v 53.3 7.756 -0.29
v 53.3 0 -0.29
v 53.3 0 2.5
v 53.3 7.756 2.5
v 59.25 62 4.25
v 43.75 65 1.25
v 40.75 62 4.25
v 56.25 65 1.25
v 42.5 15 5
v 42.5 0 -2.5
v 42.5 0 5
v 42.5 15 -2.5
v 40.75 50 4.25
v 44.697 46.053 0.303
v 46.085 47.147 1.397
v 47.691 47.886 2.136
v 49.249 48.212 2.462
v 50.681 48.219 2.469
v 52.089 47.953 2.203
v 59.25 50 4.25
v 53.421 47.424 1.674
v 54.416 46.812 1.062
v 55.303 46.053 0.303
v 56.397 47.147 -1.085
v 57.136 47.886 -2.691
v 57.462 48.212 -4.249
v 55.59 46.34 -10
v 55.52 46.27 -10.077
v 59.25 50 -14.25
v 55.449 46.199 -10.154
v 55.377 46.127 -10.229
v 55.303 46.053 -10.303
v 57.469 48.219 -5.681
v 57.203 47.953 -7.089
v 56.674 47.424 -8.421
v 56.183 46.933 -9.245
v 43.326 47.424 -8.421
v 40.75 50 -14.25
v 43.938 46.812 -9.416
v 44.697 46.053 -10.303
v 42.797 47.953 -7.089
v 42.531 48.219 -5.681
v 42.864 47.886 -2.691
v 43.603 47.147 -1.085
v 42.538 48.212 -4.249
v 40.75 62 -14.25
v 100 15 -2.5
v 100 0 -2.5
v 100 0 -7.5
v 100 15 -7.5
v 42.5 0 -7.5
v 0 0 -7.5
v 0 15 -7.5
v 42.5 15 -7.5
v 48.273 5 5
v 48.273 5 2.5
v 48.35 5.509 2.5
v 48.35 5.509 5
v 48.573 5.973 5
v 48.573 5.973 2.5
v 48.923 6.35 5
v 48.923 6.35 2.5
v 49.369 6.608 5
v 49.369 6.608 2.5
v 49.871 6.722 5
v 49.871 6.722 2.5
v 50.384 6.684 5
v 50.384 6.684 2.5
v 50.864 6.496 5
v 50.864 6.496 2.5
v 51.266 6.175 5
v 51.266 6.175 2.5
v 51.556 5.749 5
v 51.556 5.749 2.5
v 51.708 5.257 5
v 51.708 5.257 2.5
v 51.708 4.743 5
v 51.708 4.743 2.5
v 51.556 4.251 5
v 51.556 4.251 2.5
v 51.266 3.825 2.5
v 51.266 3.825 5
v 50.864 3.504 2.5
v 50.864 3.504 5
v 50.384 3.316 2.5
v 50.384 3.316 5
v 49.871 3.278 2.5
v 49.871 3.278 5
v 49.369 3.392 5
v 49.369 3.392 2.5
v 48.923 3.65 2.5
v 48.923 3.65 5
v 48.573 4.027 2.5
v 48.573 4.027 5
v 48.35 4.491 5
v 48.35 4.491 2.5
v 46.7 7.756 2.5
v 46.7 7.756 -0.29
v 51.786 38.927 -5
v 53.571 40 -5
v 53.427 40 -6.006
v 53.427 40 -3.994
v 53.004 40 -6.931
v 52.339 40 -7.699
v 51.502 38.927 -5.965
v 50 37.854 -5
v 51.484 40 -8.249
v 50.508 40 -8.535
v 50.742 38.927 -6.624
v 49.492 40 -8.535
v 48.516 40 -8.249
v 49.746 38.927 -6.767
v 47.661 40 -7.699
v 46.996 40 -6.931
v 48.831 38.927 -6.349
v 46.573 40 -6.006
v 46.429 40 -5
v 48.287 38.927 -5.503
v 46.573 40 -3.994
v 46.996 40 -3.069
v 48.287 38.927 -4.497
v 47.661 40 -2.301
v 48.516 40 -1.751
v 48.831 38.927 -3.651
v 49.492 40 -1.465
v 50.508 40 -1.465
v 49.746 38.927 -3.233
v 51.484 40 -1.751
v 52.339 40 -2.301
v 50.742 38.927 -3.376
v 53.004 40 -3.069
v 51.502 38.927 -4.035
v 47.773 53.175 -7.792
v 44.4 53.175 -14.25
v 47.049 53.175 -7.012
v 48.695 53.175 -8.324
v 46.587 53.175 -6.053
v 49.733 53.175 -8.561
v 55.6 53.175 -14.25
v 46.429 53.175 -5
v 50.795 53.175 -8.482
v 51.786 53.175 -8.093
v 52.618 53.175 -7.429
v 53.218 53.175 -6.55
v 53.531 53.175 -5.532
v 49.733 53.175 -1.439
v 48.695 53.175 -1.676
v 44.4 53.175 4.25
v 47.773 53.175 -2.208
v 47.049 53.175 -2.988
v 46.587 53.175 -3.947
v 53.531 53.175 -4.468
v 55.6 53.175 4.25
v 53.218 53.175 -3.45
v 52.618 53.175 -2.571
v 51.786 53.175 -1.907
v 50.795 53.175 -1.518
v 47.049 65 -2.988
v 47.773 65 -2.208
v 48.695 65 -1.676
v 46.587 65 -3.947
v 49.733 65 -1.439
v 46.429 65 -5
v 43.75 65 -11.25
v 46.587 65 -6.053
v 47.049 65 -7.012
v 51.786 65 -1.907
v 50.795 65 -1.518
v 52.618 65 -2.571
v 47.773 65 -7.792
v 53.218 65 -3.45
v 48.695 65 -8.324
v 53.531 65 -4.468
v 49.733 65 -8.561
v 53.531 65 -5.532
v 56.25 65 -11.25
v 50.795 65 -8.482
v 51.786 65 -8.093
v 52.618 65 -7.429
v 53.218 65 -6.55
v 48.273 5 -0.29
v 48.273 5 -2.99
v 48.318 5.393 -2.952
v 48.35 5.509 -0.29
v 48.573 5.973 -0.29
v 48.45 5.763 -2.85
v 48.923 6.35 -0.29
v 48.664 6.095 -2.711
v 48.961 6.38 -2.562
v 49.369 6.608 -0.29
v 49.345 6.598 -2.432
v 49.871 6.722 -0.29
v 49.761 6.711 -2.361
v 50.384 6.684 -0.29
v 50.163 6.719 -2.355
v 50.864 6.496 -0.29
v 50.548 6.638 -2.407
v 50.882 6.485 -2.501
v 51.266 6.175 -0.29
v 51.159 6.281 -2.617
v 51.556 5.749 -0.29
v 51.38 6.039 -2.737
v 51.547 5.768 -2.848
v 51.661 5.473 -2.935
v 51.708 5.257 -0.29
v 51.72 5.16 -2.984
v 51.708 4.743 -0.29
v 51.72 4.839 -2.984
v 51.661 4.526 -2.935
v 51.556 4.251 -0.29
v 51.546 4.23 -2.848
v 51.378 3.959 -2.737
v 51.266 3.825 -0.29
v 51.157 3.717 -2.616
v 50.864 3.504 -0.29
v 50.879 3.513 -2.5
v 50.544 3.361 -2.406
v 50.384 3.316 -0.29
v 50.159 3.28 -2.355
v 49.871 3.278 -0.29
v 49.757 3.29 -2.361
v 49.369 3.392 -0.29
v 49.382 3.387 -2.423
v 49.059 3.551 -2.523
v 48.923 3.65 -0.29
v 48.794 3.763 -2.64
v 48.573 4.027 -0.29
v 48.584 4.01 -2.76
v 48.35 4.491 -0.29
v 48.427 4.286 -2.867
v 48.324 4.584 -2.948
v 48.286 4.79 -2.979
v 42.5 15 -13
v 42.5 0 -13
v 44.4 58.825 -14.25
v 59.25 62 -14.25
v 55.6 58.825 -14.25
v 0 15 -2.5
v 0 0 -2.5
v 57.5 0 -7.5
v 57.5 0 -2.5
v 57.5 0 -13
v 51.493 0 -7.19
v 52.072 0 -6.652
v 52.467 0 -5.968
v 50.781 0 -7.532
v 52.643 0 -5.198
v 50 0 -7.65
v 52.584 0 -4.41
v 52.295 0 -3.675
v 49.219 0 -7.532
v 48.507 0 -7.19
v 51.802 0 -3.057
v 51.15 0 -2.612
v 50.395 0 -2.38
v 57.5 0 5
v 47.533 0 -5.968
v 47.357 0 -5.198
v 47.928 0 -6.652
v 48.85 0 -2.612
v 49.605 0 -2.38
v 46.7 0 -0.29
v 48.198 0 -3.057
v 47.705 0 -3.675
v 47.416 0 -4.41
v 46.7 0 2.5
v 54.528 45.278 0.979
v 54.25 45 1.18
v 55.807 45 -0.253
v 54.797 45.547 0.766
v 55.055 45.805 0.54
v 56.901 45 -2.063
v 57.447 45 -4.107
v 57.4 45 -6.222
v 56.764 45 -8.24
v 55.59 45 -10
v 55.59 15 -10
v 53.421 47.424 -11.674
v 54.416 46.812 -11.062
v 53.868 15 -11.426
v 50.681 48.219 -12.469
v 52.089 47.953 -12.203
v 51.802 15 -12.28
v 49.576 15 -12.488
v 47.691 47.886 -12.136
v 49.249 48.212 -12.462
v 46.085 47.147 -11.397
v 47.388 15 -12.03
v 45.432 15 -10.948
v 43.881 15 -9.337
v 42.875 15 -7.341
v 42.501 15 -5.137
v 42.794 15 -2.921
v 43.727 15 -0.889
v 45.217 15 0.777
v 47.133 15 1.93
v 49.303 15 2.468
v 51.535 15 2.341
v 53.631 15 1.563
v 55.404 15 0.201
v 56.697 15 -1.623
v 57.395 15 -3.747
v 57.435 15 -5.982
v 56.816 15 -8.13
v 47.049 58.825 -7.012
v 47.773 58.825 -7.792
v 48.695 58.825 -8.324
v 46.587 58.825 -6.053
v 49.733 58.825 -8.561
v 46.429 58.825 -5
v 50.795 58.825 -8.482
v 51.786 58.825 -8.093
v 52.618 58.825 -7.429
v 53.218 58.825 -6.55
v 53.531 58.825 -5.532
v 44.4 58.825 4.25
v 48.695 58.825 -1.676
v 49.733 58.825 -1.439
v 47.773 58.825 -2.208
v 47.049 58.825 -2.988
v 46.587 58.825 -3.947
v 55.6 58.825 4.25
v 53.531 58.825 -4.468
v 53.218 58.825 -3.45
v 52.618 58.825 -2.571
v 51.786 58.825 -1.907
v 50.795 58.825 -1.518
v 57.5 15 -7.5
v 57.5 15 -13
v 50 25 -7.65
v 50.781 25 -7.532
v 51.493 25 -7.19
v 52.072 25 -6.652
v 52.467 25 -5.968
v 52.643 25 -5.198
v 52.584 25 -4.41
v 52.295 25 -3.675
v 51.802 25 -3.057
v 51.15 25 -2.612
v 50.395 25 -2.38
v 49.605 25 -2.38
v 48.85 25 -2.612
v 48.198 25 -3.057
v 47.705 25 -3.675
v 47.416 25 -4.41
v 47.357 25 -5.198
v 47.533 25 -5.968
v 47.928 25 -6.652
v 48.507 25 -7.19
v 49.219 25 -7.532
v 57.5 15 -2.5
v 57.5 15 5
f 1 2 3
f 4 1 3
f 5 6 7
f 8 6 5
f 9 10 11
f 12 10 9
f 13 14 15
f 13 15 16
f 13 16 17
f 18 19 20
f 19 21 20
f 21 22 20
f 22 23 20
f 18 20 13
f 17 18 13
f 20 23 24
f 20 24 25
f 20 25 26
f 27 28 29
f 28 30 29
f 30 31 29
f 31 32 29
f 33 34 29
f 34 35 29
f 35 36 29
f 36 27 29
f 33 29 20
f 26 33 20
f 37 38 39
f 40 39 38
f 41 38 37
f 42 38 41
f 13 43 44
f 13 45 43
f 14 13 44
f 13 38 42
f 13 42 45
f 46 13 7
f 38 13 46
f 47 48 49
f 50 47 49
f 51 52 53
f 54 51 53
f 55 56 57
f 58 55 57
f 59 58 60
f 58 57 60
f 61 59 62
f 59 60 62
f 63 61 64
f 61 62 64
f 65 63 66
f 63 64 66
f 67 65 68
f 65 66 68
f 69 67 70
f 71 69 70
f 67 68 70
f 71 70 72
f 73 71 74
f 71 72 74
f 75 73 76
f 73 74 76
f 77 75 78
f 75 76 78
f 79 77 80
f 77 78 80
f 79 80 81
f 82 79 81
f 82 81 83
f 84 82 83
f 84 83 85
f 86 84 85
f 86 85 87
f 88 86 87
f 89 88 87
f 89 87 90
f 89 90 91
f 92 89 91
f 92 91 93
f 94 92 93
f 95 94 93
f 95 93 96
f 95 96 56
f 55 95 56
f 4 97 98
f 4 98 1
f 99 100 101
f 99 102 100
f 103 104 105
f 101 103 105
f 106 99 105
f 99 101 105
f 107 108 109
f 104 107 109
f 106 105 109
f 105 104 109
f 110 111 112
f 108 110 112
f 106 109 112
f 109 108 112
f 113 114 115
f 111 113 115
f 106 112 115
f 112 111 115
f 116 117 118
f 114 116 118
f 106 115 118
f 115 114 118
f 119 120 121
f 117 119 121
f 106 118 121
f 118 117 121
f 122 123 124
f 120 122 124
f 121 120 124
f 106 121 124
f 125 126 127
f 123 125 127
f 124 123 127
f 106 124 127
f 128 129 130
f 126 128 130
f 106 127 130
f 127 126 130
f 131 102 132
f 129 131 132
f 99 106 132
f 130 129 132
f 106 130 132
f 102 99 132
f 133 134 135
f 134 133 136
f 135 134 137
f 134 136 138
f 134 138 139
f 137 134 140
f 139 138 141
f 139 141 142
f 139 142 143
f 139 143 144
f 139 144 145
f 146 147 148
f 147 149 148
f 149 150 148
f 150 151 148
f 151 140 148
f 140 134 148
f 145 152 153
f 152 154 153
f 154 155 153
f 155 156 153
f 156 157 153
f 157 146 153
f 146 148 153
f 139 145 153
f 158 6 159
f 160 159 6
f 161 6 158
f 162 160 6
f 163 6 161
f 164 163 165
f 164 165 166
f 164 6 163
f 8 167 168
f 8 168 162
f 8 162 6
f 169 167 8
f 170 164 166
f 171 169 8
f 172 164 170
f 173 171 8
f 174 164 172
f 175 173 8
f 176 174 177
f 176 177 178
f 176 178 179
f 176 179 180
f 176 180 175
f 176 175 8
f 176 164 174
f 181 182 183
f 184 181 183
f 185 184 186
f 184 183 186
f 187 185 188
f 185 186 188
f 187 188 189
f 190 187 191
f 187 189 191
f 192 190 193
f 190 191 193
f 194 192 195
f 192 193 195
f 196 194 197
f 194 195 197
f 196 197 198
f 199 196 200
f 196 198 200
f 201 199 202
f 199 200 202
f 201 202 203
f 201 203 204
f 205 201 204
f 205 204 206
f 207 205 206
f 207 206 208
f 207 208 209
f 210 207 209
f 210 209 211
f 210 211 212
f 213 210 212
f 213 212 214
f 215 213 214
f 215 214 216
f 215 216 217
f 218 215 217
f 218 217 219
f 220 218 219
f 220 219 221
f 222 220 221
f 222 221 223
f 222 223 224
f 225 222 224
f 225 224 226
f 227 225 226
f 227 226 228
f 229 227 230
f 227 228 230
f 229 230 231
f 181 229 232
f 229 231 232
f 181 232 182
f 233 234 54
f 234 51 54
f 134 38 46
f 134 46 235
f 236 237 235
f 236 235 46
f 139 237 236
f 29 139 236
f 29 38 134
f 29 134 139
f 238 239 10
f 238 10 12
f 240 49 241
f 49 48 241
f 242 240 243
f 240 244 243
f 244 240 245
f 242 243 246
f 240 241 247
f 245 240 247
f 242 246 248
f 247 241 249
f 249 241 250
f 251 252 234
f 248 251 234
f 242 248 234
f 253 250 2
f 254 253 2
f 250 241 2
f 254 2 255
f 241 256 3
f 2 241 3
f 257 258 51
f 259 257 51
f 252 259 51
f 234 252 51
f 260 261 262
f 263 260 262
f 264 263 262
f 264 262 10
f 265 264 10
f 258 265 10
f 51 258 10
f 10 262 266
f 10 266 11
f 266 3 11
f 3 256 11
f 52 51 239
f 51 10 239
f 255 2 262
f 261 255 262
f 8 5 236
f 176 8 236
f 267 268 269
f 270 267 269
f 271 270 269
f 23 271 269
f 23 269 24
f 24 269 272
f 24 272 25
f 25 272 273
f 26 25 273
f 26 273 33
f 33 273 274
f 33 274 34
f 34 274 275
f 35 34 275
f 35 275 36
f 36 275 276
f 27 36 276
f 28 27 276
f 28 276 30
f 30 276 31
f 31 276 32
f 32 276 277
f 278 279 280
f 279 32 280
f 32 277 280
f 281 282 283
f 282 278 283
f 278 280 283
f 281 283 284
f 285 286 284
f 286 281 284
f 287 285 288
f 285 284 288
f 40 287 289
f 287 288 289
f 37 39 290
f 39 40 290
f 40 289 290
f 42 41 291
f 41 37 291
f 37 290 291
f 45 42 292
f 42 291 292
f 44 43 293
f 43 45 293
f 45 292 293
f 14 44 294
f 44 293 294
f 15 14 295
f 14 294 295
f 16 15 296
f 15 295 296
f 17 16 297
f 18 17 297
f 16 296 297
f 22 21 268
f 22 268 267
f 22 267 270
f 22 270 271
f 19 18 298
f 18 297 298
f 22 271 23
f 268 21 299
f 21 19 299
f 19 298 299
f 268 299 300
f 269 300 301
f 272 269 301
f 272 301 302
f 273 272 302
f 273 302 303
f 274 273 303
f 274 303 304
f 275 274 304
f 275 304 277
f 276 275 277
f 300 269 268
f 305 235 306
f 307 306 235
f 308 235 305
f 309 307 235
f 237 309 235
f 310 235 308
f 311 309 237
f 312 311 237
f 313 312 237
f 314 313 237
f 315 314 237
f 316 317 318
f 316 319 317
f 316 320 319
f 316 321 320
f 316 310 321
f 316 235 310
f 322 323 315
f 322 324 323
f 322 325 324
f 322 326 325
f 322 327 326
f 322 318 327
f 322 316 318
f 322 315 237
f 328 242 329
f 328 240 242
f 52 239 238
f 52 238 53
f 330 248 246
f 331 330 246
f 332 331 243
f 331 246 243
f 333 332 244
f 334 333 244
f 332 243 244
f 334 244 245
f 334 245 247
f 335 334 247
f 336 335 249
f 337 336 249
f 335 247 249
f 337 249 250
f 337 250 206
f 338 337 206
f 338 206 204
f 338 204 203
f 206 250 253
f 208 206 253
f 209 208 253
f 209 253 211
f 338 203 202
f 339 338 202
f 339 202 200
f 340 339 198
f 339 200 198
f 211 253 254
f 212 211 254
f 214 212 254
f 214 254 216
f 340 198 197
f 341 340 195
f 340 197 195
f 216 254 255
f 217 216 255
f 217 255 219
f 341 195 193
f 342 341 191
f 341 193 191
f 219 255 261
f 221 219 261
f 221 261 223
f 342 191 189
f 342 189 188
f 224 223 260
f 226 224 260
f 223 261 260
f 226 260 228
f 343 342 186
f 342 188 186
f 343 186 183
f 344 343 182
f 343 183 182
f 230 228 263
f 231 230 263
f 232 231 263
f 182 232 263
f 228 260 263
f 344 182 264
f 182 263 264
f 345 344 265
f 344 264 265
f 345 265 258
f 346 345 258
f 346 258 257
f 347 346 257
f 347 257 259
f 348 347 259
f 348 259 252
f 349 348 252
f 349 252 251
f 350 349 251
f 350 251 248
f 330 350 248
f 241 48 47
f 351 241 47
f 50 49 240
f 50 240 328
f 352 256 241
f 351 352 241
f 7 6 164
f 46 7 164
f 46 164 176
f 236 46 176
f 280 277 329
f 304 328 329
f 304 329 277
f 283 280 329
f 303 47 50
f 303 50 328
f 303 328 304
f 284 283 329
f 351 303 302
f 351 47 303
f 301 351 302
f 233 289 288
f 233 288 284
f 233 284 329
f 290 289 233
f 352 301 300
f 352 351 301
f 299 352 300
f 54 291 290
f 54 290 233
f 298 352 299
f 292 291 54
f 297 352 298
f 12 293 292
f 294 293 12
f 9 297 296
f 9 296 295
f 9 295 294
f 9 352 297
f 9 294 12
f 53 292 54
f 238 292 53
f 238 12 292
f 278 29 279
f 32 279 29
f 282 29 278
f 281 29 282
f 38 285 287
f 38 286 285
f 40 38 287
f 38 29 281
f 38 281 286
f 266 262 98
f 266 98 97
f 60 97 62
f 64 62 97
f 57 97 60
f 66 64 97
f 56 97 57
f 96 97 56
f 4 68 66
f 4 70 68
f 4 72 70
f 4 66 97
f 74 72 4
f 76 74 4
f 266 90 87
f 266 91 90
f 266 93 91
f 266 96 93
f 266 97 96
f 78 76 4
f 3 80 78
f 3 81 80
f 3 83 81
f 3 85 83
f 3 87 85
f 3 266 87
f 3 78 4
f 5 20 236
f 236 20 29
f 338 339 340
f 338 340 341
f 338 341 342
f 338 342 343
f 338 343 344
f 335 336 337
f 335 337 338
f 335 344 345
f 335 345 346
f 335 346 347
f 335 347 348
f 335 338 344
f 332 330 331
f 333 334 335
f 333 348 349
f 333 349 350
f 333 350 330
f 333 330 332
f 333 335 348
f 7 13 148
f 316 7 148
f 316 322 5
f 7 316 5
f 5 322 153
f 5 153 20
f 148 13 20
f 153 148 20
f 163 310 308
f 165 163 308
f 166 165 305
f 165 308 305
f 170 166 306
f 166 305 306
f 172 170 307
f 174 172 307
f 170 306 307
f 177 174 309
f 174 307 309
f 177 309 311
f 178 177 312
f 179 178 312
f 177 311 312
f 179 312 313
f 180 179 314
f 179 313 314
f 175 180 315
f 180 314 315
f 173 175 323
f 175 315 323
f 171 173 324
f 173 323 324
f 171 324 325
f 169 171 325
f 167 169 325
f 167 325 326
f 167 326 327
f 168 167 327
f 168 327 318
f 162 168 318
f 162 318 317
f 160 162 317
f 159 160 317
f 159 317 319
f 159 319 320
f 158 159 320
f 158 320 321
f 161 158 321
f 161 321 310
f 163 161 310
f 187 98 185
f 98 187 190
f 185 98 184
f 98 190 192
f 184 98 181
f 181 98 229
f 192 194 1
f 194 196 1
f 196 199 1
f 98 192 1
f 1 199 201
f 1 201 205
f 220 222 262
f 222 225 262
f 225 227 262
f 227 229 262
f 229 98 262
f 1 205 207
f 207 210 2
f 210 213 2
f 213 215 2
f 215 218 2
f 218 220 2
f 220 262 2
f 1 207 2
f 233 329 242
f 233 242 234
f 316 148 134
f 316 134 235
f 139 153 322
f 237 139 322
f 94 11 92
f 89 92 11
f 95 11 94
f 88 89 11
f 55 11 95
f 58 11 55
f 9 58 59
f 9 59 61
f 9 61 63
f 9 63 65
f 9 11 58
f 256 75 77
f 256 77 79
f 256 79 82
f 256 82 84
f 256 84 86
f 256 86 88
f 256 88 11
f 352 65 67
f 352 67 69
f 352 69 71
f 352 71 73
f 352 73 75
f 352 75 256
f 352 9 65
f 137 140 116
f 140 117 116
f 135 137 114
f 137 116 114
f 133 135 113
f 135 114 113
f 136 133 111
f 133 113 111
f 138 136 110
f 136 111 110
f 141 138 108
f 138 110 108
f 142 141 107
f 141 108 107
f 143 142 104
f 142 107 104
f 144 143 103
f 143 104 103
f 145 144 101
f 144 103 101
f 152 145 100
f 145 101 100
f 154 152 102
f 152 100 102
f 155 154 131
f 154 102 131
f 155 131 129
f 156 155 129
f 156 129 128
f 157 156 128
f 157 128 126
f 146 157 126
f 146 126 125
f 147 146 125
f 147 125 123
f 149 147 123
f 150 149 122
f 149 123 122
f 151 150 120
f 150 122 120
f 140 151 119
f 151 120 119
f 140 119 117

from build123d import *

# Parameters (mm, degrees)
SKETCH1_W                   = 100
SKETCH1_H                   = 10
BOSS_EXTRUDE1_DEPTH         = 15
SKETCH2_R                   = 7.5
BOSS_EXTRUDE2_DEPTH         = 30
SKETCH3_W                   = 18.5
SKETCH3_H                   = 18.5
BOSS_EXTRUDE3_DEPTH         = 20
CHAMFER1_SIZE               = 3
CHAMFER2_SIZE               = 5
SKETCH4_W                   = 11.2
SKETCH4_H                   = 5.65
CUT_EXTRUDE1_DEPTH          = 121.694863188
F_1_4_CLEARANCE_HOLE1_D     = 7.14248
F_1_4_CLEARANCE_HOLE1_DEPTH = 25
F_1_4_CLEARANCE_HOLE1_TIP   = 2.145817477
SKETCH8_W                   = 15
SKETCH8_H                   = 15
BOSS_EXTRUDE4_DEPTH         = 5
SKETCH9_R                   = 2.65
CUT_EXTRUDE2_DEPTH          = 25
F_4_CLEARANCE_HOLE1_D       = 3.4544
F_4_CLEARANCE_HOLE1_DEPTH   = 10
F_4_CLEARANCE_HOLE1_TIP     = 1.037806461
SKETCH13_W                  = 6.6
SKETCH13_H                  = 2.79
CUT_EXTRUDE3_DEPTH          = 7.7559
SKETCH14_W                  = 15
SKETCH14_H                  = 15
BOSS_EXTRUDE5_DEPTH         = 3
SKETCH15_W                  = 2.5
SKETCH15_H                  = 15
CUT_EXTRUDE4_DEPTH          = 42.5
SKETCH16_W                  = 2.5
SKETCH16_H                  = 15
CUT_EXTRUDE5_DEPTH          = 42.5


with BuildPart() as part:
    # Sketch1 → Boss-Extrude1 (new body)
    with BuildSketch(Plane(origin=(0, 0, 0), x_dir=(1, 0, 0), z_dir=(0, 1, 0))):
        with Locations((50, 5)):
            Rectangle(SKETCH1_W, SKETCH1_H)
    extrude(amount=BOSS_EXTRUDE1_DEPTH)

    # Sketch2 → Boss-Extrude2 (add)
    with BuildSketch(Plane(origin=(0, 15, 0), x_dir=(1, 0, 0), z_dir=(0, 1, 0))):
        with Locations(Location((50, 5, 0), (0, 0, 41.810314896))):
            Circle(SKETCH2_R)
    extrude(amount=BOSS_EXTRUDE2_DEPTH)

    # Sketch3 → Boss-Extrude3 (add)
    with BuildSketch(Plane(origin=(0, 45, 0), x_dir=(1, 0, 0), z_dir=(0, 1, 0))):
        with Locations((50, 5)):
            Rectangle(SKETCH3_W, SKETCH3_H)
    extrude(amount=BOSS_EXTRUDE3_DEPTH)

    # Chamfer1
    chamfer1_edges = [part.edges().sort_by_distance(p)[0] for p in [
        (40.75, 65, -5),
        (50, 65, 4.25),
        (59.25, 65, -5),
        (50, 65, -14.25),
    ]]
    chamfer(chamfer1_edges, length=CHAMFER1_SIZE)

    # Chamfer2
    # the kernel refuses this chamfer: 5 mm, written as the material it takes off along each edge
    with BuildSketch(Plane(origin=(27.89158506, 45, -14.25), x_dir=(0, 0.9996219169112968, -0.027495876610586317), z_dir=(1, 0, 0))) as chamfer2_piece_1_section:
        Polygon((CHAMFER2_SIZE * 0.999621916911, CHAMFER2_SIZE * 0.0274958766106), (-CHAMFER2_SIZE * 0.0274958766106, CHAMFER2_SIZE * 0.999621916911), (0, 0), align=None)
    chamfer2_piece_1 = extrude(amount=44.21682988, mode=Mode.PRIVATE)
    chamfer2_piece_1 = chamfer2_piece_1 - Plane(origin=(50, 46.70985324, -5), x_dir=(0.7453559924973537, 0, -0.6666666666695469), z_dir=(0, -1, 0)) * Cylinder(7.5, 109, mode=Mode.PRIVATE)
    with BuildSketch(Plane(origin=(40.75, 45, 17.10841494), x_dir=(-0.027495876610586317, 0.9996219169112968, 0), z_dir=(0, 0, -1))) as chamfer2_piece_2_section:
        Polygon((CHAMFER2_SIZE * 0.999621916911, CHAMFER2_SIZE * 0.0274958766106), (-CHAMFER2_SIZE * 0.0274958766106, CHAMFER2_SIZE * 0.999621916911), (0, 0), align=None)
    chamfer2_piece_2 = extrude(amount=44.21682988, mode=Mode.PRIVATE)
    chamfer2_piece_2 = chamfer2_piece_2 - Plane(origin=(50, 46.709853278, -5), x_dir=(0.7453559924973537, 0, -0.6666666666695469), z_dir=(0, -1, 0)) * Cylinder(7.5, 109, mode=Mode.PRIVATE)
    with BuildSketch(Plane(origin=(59.25, 45, -27.10841494), x_dir=(-0.9996219169112968, -0.027495876610586317, 0), z_dir=(0, 0, 1))) as chamfer2_piece_3_section:
        Polygon((CHAMFER2_SIZE * 0.999621916911, -CHAMFER2_SIZE * 0.0274958766106), (-CHAMFER2_SIZE * 0.0274958766106, -CHAMFER2_SIZE * 0.999621916911), (0, 0), align=None)
    chamfer2_piece_3 = extrude(amount=44.21682988, mode=Mode.PRIVATE)
    chamfer2_piece_3 = chamfer2_piece_3 - Plane(origin=(50, 46.709853248, -5), x_dir=(0.7453559924973537, 0, -0.6666666666695469), z_dir=(0, -1, 0)) * Cylinder(7.5, 109, mode=Mode.PRIVATE)
    with BuildSketch(Plane(origin=(72.10841494, 45, 4.25), x_dir=(0, -0.027495876610586317, -0.9996219169112968), z_dir=(-1, 0, 0))) as chamfer2_piece_4_section:
        Polygon((CHAMFER2_SIZE * 0.999621916911, -CHAMFER2_SIZE * 0.0274958766106), (-CHAMFER2_SIZE * 0.0274958766106, -CHAMFER2_SIZE * 0.999621916911), (0, 0), align=None)
    chamfer2_piece_4 = extrude(amount=44.21682988, mode=Mode.PRIVATE)
    chamfer2_piece_4 = chamfer2_piece_4 - Plane(origin=(50, 46.709853226, -5), x_dir=(0.7453559924973537, 0, -0.6666666666695469), z_dir=(0, -1, 0)) * Cylinder(7.5, 109, mode=Mode.PRIVATE)
    add([chamfer2_piece_1, chamfer2_piece_2, chamfer2_piece_3, chamfer2_piece_4], mode=Mode.SUBTRACT)

    # Sketch4 → Cut-Extrude1 (cut, through all)
    with BuildSketch(Plane.XY.offset(4.25)):
        with Locations((50, 56)):
            Rectangle(SKETCH4_W, SKETCH4_H)
    extrude(amount=-CUT_EXTRUDE1_DEPTH, mode=Mode.SUBTRACT)

    # 1/4 Clearance Hole1
    with Locations(Plane(origin=(0, 65, 0), x_dir=(1, 0, 0), z_dir=(0, 1, 0))):
        with Locations((50, 5)):
            Hole(F_1_4_CLEARANCE_HOLE1_D / 2, depth=F_1_4_CLEARANCE_HOLE1_DEPTH)
            with Locations((0, 0, -(F_1_4_CLEARANCE_HOLE1_DEPTH + F_1_4_CLEARANCE_HOLE1_TIP / 2))):  # 118° drill point
                Cone(0, F_1_4_CLEARANCE_HOLE1_D / 2, F_1_4_CLEARANCE_HOLE1_TIP, mode=Mode.SUBTRACT)

    # Sketch8 → Boss-Extrude4 (add)
    with BuildSketch(Plane.XY):
        with Locations((50, 7.5)):
            Rectangle(SKETCH8_W, SKETCH8_H)
    extrude(amount=BOSS_EXTRUDE4_DEPTH)

    # Sketch9 → Cut-Extrude2 (cut)
    with BuildSketch(Plane.XZ):
        with Locations(Location((50, -5, 0), (0, 0, 270))):
            Circle(SKETCH9_R)
    extrude(amount=-CUT_EXTRUDE2_DEPTH, mode=Mode.SUBTRACT)

    # #4 Clearance Hole1
    with Locations(Plane.XY.offset(5)):
        with Locations((50, 5)):
            Hole(F_4_CLEARANCE_HOLE1_D / 2, depth=F_4_CLEARANCE_HOLE1_DEPTH)
            with Locations((0, 0, -(F_4_CLEARANCE_HOLE1_DEPTH + F_4_CLEARANCE_HOLE1_TIP / 2))):  # 118° drill point
                Cone(0, F_4_CLEARANCE_HOLE1_D / 2, F_4_CLEARANCE_HOLE1_TIP, mode=Mode.SUBTRACT)

    # Sketch13 → Cut-Extrude3 (cut)
    with BuildSketch(Plane.XZ):
        with Locations((50, 1.105)):
            Rectangle(SKETCH13_W, SKETCH13_H)
    extrude(amount=-CUT_EXTRUDE3_DEPTH, mode=Mode.SUBTRACT)

    # Sketch14 → Boss-Extrude5 (add)
    with BuildSketch(Plane(origin=(0, 0, -10), x_dir=(-1, 0, 0), z_dir=(0, 0, -1))):
        with Locations((-50, 7.5)):
            Rectangle(SKETCH14_W, SKETCH14_H)
    extrude(amount=BOSS_EXTRUDE5_DEPTH)

    # Sketch15 → Cut-Extrude4 (cut)
    with BuildSketch(Plane(origin=(100, 0, 0), x_dir=(0, 0, -1), z_dir=(1, 0, 0))):
        with Locations((1.25, 7.5)):
            Rectangle(SKETCH15_W, SKETCH15_H)
        with Locations((8.75, 7.5)):
            Rectangle(SKETCH15_W, SKETCH15_H)
    extrude(amount=-CUT_EXTRUDE4_DEPTH, mode=Mode.SUBTRACT)

    # Sketch16 → Cut-Extrude5 (cut)
    with BuildSketch(Plane.ZY):
        with Locations((-8.75, 7.5)):
            Rectangle(SKETCH16_W, SKETCH16_H)
        with Locations((-1.25, 7.5)):
            Rectangle(SKETCH16_W, SKETCH16_H)
    extrude(amount=-CUT_EXTRUDE5_DEPTH, mode=Mode.SUBTRACT)


solid = part.part
